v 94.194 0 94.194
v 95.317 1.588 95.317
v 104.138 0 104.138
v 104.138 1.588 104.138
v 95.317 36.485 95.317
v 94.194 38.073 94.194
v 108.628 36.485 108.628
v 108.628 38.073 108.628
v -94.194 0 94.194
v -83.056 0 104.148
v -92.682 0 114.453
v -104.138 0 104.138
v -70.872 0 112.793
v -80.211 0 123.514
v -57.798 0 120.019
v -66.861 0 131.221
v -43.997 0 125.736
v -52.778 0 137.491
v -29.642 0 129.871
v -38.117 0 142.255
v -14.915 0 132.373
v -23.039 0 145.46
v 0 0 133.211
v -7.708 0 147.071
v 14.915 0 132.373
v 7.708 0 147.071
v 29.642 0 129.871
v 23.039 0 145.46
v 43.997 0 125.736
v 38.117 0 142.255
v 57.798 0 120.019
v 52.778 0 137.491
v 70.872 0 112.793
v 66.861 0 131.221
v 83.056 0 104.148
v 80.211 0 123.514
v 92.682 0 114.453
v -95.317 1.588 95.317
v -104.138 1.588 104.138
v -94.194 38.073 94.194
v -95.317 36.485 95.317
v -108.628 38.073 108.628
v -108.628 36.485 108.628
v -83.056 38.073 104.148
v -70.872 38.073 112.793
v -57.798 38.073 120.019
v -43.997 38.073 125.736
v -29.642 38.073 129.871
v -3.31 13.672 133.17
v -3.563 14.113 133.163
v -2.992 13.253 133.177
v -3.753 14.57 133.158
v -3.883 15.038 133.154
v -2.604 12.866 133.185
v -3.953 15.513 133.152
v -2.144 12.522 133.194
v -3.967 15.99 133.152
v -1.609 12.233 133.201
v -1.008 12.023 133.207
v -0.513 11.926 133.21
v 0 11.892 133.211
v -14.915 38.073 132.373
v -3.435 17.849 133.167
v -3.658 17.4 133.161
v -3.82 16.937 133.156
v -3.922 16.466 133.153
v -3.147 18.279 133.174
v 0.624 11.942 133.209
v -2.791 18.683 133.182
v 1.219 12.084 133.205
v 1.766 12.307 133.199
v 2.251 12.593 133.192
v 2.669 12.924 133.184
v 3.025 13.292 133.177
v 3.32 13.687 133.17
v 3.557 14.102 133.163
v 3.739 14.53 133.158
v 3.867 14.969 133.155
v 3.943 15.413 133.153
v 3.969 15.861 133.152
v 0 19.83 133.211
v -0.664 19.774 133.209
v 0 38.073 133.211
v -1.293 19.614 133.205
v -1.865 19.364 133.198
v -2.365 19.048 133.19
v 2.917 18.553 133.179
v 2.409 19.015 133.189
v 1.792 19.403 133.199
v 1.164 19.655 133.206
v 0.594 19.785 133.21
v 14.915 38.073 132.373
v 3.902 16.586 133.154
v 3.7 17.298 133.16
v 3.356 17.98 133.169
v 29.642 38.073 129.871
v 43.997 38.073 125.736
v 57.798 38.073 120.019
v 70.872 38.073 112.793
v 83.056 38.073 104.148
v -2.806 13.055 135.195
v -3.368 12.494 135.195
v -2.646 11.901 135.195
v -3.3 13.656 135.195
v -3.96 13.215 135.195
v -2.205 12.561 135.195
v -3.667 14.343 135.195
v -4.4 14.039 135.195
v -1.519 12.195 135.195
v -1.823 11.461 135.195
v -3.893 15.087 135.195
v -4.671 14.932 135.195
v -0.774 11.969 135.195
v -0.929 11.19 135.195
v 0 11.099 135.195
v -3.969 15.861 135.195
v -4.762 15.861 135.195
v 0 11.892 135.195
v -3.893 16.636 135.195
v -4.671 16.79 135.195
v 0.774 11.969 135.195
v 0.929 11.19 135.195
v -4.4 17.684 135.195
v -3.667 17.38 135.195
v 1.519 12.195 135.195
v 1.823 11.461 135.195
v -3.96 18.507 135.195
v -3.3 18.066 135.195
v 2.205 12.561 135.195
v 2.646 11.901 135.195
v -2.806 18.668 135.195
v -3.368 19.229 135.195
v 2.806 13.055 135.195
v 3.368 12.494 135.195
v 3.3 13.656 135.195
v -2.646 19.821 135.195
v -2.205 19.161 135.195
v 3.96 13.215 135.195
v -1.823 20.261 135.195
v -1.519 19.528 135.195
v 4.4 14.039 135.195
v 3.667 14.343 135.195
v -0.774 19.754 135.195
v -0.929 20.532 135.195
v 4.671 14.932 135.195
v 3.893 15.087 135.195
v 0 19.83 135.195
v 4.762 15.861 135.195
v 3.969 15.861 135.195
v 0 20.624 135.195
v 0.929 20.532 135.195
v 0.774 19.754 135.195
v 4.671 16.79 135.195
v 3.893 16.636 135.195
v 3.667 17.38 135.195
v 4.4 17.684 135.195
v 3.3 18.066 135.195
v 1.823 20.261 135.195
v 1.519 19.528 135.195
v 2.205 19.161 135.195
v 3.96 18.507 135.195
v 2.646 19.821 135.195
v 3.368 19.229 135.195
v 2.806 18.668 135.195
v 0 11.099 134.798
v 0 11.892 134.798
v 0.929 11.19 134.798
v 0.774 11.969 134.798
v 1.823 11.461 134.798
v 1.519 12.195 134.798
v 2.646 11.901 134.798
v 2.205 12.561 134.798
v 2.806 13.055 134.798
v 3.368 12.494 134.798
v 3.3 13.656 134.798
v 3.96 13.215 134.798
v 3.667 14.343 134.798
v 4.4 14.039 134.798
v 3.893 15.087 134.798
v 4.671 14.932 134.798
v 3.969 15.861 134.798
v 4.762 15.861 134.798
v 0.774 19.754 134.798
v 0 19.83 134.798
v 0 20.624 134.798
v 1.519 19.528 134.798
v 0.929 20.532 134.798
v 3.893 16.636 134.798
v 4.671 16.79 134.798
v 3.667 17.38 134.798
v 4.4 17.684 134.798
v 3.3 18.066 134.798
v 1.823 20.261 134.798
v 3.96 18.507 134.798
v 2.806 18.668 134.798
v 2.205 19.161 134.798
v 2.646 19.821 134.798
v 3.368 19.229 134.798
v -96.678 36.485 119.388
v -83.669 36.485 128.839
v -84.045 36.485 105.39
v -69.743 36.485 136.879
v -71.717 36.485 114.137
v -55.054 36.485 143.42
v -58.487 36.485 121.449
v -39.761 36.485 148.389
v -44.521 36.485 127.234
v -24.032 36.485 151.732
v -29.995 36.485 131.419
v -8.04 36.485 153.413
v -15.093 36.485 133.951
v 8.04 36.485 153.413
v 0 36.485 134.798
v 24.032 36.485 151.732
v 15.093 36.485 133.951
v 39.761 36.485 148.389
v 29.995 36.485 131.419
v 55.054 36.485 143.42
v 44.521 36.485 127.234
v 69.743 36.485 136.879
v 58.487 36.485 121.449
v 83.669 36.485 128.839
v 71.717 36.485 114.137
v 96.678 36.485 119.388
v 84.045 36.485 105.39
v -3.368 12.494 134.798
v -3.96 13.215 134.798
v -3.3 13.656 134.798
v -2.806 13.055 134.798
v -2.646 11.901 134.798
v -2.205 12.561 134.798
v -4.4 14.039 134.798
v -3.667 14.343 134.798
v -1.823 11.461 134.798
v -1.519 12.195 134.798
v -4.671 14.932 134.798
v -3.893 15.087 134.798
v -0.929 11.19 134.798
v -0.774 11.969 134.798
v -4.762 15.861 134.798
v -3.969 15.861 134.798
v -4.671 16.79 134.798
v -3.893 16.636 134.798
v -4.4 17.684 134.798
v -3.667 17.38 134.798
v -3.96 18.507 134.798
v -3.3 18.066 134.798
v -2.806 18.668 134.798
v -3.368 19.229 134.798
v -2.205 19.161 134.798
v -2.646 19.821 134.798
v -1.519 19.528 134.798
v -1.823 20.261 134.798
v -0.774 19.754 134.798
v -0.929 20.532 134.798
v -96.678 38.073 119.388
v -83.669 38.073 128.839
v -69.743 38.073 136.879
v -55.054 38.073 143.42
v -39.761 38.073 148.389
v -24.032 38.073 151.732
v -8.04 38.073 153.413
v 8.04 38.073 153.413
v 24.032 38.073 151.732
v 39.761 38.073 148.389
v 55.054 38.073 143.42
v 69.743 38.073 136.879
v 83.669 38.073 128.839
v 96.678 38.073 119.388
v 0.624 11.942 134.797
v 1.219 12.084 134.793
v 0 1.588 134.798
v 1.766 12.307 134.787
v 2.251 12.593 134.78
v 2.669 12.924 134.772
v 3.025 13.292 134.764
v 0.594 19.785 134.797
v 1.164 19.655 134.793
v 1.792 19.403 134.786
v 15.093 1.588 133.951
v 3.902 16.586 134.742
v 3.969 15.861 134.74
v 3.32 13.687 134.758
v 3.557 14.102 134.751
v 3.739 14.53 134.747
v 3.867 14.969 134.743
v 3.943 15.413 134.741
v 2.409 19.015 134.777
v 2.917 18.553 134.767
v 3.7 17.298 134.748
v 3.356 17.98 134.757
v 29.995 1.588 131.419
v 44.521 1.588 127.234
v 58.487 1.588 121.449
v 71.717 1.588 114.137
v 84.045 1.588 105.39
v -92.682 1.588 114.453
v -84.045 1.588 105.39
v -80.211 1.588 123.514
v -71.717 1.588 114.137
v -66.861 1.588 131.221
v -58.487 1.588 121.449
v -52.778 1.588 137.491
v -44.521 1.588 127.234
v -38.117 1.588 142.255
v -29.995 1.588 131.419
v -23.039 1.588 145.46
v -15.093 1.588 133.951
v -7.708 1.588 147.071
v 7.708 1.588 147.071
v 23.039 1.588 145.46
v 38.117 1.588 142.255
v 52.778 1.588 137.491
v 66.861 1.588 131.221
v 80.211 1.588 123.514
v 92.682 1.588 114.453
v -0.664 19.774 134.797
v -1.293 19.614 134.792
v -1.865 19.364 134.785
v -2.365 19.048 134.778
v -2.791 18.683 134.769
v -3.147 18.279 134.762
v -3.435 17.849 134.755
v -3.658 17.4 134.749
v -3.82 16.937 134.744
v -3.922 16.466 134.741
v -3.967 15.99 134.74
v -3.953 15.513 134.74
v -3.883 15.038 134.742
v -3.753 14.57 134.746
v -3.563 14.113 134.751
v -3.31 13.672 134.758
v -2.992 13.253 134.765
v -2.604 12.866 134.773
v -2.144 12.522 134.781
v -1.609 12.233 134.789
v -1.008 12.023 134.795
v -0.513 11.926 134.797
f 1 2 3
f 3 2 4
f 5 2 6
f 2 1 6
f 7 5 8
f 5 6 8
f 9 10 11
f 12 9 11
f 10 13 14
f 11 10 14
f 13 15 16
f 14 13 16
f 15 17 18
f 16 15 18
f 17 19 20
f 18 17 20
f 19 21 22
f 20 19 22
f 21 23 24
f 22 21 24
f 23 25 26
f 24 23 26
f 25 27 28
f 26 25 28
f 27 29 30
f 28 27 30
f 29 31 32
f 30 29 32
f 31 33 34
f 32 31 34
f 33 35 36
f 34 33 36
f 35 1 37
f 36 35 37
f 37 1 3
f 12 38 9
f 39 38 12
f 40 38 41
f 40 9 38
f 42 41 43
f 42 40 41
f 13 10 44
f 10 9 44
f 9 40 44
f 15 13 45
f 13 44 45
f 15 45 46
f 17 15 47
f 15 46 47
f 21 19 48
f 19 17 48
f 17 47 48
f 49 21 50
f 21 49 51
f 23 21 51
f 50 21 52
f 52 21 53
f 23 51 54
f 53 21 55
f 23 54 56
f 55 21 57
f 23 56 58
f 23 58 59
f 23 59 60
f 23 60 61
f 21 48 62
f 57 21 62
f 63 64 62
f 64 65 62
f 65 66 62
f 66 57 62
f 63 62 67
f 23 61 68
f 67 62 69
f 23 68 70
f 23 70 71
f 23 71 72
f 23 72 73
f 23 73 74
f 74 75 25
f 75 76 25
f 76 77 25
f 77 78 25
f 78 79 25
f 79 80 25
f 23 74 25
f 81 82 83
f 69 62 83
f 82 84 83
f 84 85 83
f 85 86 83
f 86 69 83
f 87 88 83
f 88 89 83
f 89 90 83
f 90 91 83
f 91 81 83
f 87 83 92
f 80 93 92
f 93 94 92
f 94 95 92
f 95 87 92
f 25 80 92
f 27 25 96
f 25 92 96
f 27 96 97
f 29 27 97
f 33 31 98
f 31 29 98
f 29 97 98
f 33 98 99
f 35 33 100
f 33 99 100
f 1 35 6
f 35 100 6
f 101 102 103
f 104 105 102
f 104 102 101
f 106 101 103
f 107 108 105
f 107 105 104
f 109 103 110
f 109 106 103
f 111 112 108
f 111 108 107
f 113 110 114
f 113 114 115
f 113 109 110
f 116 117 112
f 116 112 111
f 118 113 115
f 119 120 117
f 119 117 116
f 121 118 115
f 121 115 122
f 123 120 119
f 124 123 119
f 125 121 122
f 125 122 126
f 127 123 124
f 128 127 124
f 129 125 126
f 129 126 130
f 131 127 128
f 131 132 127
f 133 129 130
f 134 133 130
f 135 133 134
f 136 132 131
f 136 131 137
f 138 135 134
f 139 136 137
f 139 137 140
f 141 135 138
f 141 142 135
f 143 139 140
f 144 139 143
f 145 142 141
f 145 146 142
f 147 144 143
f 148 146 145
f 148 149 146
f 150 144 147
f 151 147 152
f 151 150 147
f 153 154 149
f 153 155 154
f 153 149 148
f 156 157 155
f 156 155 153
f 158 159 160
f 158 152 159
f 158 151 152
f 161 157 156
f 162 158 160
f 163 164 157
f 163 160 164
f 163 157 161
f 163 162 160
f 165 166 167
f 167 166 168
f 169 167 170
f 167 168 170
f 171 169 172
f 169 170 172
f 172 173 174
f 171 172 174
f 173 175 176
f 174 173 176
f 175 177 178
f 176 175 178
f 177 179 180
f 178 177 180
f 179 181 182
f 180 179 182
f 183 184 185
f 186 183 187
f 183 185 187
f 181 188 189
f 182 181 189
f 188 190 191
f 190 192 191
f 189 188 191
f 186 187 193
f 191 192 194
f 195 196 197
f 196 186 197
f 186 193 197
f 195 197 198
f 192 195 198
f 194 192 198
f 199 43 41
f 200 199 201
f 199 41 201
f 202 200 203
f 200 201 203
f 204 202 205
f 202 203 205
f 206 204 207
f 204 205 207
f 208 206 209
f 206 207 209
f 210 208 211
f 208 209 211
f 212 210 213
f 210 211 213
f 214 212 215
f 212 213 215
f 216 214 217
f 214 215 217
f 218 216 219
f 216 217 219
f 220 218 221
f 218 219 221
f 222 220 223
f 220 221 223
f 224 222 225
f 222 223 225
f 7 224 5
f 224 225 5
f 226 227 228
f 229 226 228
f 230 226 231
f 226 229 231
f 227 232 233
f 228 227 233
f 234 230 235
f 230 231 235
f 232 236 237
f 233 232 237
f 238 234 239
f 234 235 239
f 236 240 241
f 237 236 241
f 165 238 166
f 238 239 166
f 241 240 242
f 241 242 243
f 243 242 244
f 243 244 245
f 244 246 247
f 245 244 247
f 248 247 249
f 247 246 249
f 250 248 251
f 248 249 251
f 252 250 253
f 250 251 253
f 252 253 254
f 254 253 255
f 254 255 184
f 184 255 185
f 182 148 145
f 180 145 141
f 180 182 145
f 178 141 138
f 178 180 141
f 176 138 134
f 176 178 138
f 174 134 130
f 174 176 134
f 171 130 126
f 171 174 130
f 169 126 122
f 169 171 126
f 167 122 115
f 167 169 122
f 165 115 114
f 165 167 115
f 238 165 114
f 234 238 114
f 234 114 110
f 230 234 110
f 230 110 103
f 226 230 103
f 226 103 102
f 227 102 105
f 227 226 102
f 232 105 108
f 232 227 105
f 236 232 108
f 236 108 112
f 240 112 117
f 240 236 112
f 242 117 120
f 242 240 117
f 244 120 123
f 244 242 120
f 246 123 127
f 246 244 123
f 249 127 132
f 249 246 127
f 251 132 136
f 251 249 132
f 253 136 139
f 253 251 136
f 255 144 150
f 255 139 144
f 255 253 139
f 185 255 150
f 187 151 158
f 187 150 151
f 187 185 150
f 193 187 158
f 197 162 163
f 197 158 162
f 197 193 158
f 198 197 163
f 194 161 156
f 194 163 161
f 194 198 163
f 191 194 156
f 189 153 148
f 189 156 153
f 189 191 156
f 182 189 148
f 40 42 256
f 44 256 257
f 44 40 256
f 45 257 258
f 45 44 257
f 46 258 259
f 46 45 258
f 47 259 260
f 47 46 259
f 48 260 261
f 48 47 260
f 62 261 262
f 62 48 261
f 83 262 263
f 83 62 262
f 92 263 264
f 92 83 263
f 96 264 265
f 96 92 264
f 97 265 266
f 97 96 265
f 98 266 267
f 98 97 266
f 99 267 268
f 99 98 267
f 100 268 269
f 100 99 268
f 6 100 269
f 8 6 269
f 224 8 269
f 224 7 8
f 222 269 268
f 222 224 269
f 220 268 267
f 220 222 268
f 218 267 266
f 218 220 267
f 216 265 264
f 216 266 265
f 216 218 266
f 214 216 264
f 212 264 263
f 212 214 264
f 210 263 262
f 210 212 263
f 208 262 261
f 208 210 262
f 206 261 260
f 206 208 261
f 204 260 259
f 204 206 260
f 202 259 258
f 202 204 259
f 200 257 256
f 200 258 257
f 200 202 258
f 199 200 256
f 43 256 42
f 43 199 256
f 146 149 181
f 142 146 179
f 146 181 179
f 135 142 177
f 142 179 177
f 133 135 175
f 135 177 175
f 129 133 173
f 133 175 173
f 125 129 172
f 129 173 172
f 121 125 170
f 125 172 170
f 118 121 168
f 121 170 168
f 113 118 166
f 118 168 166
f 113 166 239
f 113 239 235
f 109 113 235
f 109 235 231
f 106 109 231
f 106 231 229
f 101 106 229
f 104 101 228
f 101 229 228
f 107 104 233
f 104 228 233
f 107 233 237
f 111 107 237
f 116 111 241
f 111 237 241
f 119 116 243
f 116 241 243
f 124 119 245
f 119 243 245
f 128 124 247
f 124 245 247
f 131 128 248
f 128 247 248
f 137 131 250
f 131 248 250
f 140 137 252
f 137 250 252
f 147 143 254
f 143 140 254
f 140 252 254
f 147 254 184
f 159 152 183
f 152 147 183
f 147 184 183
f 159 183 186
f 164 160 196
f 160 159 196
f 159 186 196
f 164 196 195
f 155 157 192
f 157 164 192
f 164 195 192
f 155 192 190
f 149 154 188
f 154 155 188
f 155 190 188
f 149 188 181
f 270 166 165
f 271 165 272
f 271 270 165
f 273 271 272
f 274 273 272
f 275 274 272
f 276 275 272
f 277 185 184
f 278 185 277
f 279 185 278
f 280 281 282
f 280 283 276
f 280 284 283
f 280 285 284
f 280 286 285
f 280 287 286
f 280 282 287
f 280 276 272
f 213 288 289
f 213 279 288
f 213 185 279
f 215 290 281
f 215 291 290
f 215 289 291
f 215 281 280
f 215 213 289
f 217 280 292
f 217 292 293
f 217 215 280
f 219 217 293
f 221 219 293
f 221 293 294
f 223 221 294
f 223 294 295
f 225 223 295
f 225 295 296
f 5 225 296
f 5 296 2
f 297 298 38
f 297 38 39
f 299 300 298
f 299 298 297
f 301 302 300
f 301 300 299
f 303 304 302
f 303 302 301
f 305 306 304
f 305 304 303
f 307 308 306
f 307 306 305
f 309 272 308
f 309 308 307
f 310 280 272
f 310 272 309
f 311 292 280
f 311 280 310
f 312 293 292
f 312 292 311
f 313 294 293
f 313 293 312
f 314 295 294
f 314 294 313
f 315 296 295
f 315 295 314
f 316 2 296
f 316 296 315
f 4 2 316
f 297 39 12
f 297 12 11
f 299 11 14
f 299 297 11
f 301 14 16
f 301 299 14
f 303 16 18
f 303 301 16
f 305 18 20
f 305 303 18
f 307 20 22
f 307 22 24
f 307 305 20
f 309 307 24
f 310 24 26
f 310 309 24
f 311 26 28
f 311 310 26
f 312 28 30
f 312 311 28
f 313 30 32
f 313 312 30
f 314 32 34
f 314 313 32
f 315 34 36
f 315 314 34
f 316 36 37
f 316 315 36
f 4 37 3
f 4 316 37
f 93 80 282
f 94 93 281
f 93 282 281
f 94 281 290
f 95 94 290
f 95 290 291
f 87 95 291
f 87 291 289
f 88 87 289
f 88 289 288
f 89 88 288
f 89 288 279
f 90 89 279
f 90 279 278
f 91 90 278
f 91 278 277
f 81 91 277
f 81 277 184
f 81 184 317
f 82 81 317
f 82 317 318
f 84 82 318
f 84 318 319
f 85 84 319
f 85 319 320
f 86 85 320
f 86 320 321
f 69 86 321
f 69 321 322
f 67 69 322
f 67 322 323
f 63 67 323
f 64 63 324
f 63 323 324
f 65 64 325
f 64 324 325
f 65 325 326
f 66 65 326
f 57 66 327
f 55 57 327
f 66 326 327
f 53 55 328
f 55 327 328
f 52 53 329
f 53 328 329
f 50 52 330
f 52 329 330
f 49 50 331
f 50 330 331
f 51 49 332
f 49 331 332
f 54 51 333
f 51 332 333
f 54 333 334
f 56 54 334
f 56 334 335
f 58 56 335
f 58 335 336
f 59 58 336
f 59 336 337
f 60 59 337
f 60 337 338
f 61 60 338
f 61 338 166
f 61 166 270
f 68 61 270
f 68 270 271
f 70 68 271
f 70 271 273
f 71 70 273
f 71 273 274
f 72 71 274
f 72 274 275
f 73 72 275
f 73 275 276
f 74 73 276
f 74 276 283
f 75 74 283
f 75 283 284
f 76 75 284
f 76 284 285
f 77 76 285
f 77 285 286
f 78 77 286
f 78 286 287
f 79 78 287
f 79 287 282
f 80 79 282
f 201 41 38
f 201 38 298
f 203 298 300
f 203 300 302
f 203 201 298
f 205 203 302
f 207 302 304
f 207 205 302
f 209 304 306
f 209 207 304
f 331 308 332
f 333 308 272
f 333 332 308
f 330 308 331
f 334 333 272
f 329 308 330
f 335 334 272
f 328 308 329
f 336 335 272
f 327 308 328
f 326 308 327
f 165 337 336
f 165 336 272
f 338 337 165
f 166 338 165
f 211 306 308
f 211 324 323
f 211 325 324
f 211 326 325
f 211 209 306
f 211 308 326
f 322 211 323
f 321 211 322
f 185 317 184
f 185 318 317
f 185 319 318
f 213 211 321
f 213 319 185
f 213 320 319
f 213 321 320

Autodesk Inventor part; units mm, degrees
ref_plane "YZ Plane" through (0, 0, 0) normal (1, 0, 0) x (0, 1, 0)
ref_plane "XZ Plane" through (0, 0, 0) normal (0, 1, 0) x (-1, 0, 0)
sketch "Sketch1" plane through (0, 0, 0) normal (1, 0, 0) x (0, 1, 0)
  line L0 (0, 0) -> (28.6807, 0)
  line L1 (0, 133.2109) -> (36.4852, 133.2109)
  line L2 (0, 133.2109) -> (0, 147.2732)
  line L3 (0, 147.2732) -> (1.5875, 147.2732)
  line L4 (1.5875, 134.7984) -> (36.4852, 134.7984)
  line L5 (36.4852, 134.7984) -> (36.4852, 133.2109)
  line L6 (1.5875, 134.7984) -> (1.5875, 147.2732)
  point P0 (15.8613, 134.7984)
  dimension "Lay2Rad" = 133.2109
  dimension "d1" = 14.0623
  dimension "d2" = 1.5875
  dimension "d3" = 36.4852
  dimension "d4" = 1.5875
  dimension "d5" = 1.5875
  dimension "d7" = 14.2738
revolve "Revolution1" add sketch "Sketch1" angle 360 about axis through (0, 0, 0) along (0, 1, 0)
ref_plane "Work Plane1" through (0, 15.8613, 134.7984) normal (0, 0, 1) x (1, 0, 0)
sketch "Sketch2" plane through (0, 15.8613, 134.7984) normal (0, 0, 1) x (1, 0, 0)
  circle A0 centre (0, 0) radius 4.7625
  circle A1 centre (0, 0) radius 3.9688
  point P0 (0, -15.8613)
  dimension "d8" = 9.525
  dimension "d11" = 7.9375
extrude "Extrusion2" cut sketch "Sketch2" against normal through all contours A1
extrude "Extrusion3" add sketch "Sketch2" along normal blind 0.3969
sketch "Sketch3" plane through (0, 36.4852, 0) normal (0, 1, 0) x (1, 0, 0)
  circle A0 centre (0, 0) radius 133.2109
  circle A1 centre (0, 0) radius 133.2109 projected
  circle A2 centre (0, 0) radius 153.6232
  circle A3 centre (0, 0) radius 147.2732 projected
  dimension "d16" = 6.35
extrude "Extrusion4" add sketch "Sketch3" along normal blind 1.5875 contours A2 | A3
sketch "Sketch4" plane through (0, 38.0727, 0) normal (0, 1, 0) x (1, 0, 0)
  line L0 (0, 0) -> (-167.0067, -167.0067)
  line L1 (0, 0) -> (236.1832, 0) construction
  line L2 (0, 0) -> (195.6261, -195.6261)
  line L3 (195.6261, -195.6261) -> (-166.4474, -166.4474)
  line L4 (-166.4474, -166.4474) -> (-176.2344, 211.1551)
  line L5 (-176.2344, 211.1551) -> (203.4461, 189.6497)
  line L6 (203.4461, 189.6497) -> (195.6261, -195.6261)
  dimension "d19" = 135
extrude "Extrusion5" cut sketch "Sketch4" against normal through all contours L0 L4 L5 L6 L2
sketch "Sketch5" plane through (94.1943, 0, 94.1943) normal (0.7071, 0, -0.7071) x (-0.7071, 0, -0.7071)
  line L0 (-6.6801, 15.8613) -> (6.5648, 15.8613)
  line L1 (0, 0) -> (-14.0623, 0) projected
  line L2 (0, 38.0727) -> (0, 0) projected
  line L3 (-0.7937, 15.8613) -> (-0.7937, 22.2113)
  line L4 (-0.7937, 22.2113) -> (0, 22.2113)
  line L5 (-0.7937, 15.8613) -> (-0.7937, 9.5113)
  line L6 (-0.7937, 9.5113) -> (-1.5875, 9.5113)
  line L7 (-1.5875, 1.5875) -> (-1.5875, 36.4852) projected
  line L8 (-1.5875, 9.5113) -> (-19.7753, 9.5113)
  line L9 (-19.7753, 9.5113) -> (-9.8215, -14.1735)
  line L10 (-9.8215, -14.1735) -> (10.1035, -9.9498)
  line L11 (10.1035, -9.9498) -> (6.5648, 15.8613)
  line L12 (0, 22.2113) -> (7.2571, 44.9587)
  line L13 (7.2571, 44.9587) -> (-27.8182, 42.4796)
  line L14 (-27.8182, 42.4796) -> (-19.0035, 23.7483)
  line L15 (133.2109, 0) -> (133.2109, 65.8048)
  line L16 (-14.0623, 1.5875) -> (-1.5875, 1.5875) projected
  line L17 (-19.0035, 23.7483) -> (-6.6801, 15.8613)
  dimension "d23" = 0.7937
  dimension "d24" = 6.35
  dimension "d25" = 6.35
  dimension "d27" = 14.2738
equation "\"Lay2Rad\" = -2 * SpWall + 0.5 * IBDia"
equation "\"d2\" = Wall"
equation "\"d3\" = d1_1 + BevDriverDia + SpWall + Space + Wall"
equation "\"d4\" = Wall"
equation "\"d5\" = Wall"
equation "\"d7\" = 1.5 * Space + 0.5 * BevDriverDia"
equation "\"d8\" = 2 * Space + AxelDia"
equation "\"d11\" = AxelDia + Space"
equation "\"d14\" = 0.25 * Wall"
equation "\"d17\" = Wall"
equation "\"d23\" = 0.5 * Wall"
equation "\"d27\" = 1.5 * Space + 0.5 * BevDriverDia"
equation "\"SpWall\" = 3.175"
equation "\"IBDia\" = 279.121792"
equation "\"Wall\" = 1.5875"
equation "\"d1_1\" = 6.35"
equation "\"BevDriverDia\" = 23.785175"
equation "\"Space\" = 1.5875"
equation "\"AxelDia\" = 6.35"
properties part number "Layer2_Prep"
